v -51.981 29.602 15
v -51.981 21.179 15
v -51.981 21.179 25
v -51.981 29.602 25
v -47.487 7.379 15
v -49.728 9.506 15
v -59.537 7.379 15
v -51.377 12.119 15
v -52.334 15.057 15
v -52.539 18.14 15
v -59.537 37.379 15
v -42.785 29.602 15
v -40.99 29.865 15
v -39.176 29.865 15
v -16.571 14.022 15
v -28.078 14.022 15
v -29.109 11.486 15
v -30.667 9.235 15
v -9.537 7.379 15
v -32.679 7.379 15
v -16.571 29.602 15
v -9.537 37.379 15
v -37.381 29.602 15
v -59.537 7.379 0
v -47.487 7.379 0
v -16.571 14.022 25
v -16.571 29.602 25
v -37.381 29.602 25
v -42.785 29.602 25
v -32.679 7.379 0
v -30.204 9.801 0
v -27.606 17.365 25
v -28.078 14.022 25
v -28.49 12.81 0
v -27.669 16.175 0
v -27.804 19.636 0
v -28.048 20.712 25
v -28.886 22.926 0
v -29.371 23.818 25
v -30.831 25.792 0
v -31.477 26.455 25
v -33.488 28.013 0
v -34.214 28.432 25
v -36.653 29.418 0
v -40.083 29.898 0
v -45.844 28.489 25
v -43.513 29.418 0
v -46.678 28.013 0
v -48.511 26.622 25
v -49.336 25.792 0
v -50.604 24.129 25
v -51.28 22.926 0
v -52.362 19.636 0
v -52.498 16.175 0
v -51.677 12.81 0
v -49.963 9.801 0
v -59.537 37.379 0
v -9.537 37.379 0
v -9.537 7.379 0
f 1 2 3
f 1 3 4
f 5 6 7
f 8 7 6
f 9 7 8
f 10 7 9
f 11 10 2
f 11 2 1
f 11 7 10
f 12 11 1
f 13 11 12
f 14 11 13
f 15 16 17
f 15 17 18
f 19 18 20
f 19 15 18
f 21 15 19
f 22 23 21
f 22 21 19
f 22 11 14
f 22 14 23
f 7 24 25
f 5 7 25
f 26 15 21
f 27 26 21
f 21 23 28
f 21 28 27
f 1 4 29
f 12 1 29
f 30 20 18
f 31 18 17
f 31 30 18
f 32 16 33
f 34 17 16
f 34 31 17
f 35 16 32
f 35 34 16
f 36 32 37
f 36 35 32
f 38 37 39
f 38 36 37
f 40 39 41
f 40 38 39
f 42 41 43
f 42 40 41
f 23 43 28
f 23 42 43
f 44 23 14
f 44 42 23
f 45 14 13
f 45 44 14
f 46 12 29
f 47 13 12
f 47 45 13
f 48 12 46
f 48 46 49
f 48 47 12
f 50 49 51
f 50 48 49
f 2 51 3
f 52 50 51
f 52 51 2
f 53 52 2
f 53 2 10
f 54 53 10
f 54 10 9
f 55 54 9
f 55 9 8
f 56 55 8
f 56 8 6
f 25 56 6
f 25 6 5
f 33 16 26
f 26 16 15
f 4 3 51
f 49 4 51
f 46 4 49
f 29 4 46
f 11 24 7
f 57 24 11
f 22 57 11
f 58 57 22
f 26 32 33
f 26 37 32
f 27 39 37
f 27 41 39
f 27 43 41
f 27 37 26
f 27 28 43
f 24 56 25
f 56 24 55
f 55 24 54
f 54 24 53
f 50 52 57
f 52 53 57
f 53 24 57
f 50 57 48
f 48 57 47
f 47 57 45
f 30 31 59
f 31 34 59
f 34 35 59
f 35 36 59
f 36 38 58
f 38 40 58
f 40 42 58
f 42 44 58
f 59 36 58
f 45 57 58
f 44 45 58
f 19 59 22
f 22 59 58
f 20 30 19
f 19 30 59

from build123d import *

# Parameters (mm, degrees)
F0_W     = 50
F0_H     = 30
F1_DEPTH = 15
F2_W     = 35.409173
F2_H     = 15.580036
F3_DEPTH = 10
F4_R     = 12.476899
F5_DEPTH = 25


with BuildPart() as f1:
    # F0 (on Top) → F1 (new body)
    with BuildSketch(Plane.XY):
        with Locations((-34.536691, 22.37889)):
            Rectangle(F0_W, F0_H)
    extrude(amount=F1_DEPTH)

    # F2 (on face) → F3 (join)
    with BuildSketch(Plane.XY.offset(15)):
        with Locations((-34.27608, 21.812051)):
            Rectangle(F2_W, F2_H)
    extrude(amount=F3_DEPTH)

    # F4 (on Top) → F5 (cut)
    with BuildSketch(Plane.XY):
        with Locations((-40.083185, 17.421314)):
            Circle(F4_R)
    extrude(amount=F5_DEPTH, mode=Mode.SUBTRACT)


solid = f1.part
